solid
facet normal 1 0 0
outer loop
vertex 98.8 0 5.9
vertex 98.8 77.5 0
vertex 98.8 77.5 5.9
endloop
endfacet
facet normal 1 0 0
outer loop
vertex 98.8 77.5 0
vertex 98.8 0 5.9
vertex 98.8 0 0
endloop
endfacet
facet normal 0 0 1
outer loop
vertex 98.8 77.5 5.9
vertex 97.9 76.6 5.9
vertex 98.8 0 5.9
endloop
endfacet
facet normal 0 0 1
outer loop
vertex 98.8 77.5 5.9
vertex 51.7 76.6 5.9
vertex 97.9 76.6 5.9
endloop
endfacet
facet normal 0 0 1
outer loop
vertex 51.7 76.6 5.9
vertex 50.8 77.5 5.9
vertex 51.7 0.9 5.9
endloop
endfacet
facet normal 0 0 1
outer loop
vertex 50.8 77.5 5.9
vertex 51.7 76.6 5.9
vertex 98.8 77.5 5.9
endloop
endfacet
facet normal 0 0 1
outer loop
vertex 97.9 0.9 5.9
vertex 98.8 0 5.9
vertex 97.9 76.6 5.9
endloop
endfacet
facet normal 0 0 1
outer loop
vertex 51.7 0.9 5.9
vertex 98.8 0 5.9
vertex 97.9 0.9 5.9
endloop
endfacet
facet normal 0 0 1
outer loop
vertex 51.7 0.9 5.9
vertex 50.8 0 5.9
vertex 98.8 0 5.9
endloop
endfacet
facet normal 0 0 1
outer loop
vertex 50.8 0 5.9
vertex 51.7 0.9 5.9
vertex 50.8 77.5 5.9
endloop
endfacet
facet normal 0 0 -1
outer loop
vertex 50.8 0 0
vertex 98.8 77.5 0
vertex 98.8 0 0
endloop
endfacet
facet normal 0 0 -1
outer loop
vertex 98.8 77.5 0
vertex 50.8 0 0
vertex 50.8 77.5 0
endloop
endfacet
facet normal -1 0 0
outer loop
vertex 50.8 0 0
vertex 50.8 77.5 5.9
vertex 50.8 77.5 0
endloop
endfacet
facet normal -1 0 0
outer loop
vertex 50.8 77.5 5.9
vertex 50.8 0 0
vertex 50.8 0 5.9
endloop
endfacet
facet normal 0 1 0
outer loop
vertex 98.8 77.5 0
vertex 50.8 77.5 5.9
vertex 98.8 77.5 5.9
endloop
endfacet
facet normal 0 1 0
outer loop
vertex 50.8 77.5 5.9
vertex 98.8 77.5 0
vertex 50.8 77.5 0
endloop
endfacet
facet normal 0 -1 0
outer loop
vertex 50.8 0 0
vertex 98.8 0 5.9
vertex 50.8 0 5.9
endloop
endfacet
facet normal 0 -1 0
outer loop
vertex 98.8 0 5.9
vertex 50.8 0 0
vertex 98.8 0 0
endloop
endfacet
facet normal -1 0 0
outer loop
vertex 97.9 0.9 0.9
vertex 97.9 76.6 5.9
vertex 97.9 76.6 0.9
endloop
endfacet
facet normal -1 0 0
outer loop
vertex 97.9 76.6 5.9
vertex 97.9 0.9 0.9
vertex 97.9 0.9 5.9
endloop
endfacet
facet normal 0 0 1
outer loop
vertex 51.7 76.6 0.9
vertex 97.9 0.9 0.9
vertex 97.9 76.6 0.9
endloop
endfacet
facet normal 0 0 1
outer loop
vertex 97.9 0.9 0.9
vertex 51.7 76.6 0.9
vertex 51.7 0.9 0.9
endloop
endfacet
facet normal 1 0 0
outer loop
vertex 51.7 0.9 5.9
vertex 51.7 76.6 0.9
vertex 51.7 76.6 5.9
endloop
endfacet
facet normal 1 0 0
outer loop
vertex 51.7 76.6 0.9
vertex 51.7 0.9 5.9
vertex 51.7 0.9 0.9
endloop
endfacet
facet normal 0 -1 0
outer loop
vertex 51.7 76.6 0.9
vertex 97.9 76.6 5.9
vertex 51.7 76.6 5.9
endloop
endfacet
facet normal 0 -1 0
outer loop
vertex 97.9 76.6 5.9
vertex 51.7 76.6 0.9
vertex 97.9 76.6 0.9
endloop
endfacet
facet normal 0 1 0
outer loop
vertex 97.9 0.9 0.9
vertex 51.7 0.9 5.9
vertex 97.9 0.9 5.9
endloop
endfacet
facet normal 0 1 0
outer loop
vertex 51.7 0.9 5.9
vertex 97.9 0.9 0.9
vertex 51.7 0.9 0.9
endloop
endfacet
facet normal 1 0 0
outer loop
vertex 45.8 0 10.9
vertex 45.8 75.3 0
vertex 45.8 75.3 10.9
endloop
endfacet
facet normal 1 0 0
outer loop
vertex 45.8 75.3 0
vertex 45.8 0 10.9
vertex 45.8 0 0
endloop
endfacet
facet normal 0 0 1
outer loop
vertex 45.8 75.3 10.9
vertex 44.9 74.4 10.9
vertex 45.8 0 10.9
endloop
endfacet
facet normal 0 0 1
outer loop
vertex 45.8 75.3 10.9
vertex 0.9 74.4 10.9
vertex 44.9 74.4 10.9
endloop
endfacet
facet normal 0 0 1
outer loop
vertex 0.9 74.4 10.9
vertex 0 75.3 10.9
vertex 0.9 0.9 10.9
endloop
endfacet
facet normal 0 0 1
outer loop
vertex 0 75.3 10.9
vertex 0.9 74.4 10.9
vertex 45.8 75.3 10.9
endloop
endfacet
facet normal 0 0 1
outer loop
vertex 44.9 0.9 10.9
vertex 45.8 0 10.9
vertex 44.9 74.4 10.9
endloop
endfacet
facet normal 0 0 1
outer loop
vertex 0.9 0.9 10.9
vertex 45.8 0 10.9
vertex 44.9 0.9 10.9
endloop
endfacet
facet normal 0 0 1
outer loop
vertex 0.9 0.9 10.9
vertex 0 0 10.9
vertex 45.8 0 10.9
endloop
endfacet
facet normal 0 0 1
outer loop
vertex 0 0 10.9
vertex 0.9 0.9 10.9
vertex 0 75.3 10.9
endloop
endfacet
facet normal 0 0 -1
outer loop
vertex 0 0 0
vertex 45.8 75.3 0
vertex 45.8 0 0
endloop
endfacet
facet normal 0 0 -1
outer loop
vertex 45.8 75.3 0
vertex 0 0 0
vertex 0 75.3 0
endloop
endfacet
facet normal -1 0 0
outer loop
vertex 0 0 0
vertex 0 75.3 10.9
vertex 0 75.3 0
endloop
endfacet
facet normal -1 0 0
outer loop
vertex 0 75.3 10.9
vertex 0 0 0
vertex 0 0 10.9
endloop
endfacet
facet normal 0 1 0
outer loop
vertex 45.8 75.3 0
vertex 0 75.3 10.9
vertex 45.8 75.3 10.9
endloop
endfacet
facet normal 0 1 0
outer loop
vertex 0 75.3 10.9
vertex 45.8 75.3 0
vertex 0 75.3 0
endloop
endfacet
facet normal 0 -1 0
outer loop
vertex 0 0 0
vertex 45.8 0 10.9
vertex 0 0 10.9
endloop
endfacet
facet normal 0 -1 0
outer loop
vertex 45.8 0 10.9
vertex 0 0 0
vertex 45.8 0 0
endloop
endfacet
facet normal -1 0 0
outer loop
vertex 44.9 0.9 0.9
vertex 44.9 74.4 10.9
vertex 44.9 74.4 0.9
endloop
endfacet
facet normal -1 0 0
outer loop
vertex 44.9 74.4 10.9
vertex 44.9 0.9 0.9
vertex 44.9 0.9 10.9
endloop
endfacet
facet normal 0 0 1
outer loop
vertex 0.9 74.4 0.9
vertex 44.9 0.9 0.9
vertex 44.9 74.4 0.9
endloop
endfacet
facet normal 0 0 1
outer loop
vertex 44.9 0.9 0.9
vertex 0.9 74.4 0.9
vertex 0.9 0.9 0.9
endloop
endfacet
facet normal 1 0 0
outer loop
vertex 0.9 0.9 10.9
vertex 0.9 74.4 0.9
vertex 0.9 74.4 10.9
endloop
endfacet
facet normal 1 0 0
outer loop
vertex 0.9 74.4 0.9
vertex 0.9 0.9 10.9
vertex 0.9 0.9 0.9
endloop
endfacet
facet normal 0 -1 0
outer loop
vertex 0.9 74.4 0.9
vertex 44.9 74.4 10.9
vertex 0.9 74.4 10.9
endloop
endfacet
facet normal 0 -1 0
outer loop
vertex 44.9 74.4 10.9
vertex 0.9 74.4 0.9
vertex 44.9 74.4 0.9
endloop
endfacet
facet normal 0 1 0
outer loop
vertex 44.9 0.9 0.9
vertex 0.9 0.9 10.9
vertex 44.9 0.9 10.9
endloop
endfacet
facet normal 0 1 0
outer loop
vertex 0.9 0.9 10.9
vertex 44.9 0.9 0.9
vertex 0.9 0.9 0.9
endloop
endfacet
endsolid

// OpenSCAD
t = 0.1; //helper

tol_cap = 0.4; // cap tolerance - for easy opening
cap_depth = 5;

inner_width = 44;
inner_height = 73.5;
inner_depth = 10;

wall_thickness = 0.9;

translate([inner_width+wall_thickness*2+5, 0,0]) cap();
bottom();
//cube([inner_width, inner_height, inner_depth]);
module cap() {   
    difference() {
        cube([inner_width+4*wall_thickness+tol_cap, inner_height+4*wall_thickness+tol_cap, cap_depth+wall_thickness]);
        translate([wall_thickness,wall_thickness,wall_thickness]) cube([inner_width+2*wall_thickness+tol_cap, inner_height+2*wall_thickness+tol_cap, cap_depth+t]);
    }
}

module bottom() {

    difference() {
        cube([inner_width+2*wall_thickness, inner_height+2*wall_thickness, inner_depth+wall_thickness]);
        
        translate([wall_thickness, wall_thickness, wall_thickness]) cube([inner_width, inner_height, inner_depth+t]);
    }
}
